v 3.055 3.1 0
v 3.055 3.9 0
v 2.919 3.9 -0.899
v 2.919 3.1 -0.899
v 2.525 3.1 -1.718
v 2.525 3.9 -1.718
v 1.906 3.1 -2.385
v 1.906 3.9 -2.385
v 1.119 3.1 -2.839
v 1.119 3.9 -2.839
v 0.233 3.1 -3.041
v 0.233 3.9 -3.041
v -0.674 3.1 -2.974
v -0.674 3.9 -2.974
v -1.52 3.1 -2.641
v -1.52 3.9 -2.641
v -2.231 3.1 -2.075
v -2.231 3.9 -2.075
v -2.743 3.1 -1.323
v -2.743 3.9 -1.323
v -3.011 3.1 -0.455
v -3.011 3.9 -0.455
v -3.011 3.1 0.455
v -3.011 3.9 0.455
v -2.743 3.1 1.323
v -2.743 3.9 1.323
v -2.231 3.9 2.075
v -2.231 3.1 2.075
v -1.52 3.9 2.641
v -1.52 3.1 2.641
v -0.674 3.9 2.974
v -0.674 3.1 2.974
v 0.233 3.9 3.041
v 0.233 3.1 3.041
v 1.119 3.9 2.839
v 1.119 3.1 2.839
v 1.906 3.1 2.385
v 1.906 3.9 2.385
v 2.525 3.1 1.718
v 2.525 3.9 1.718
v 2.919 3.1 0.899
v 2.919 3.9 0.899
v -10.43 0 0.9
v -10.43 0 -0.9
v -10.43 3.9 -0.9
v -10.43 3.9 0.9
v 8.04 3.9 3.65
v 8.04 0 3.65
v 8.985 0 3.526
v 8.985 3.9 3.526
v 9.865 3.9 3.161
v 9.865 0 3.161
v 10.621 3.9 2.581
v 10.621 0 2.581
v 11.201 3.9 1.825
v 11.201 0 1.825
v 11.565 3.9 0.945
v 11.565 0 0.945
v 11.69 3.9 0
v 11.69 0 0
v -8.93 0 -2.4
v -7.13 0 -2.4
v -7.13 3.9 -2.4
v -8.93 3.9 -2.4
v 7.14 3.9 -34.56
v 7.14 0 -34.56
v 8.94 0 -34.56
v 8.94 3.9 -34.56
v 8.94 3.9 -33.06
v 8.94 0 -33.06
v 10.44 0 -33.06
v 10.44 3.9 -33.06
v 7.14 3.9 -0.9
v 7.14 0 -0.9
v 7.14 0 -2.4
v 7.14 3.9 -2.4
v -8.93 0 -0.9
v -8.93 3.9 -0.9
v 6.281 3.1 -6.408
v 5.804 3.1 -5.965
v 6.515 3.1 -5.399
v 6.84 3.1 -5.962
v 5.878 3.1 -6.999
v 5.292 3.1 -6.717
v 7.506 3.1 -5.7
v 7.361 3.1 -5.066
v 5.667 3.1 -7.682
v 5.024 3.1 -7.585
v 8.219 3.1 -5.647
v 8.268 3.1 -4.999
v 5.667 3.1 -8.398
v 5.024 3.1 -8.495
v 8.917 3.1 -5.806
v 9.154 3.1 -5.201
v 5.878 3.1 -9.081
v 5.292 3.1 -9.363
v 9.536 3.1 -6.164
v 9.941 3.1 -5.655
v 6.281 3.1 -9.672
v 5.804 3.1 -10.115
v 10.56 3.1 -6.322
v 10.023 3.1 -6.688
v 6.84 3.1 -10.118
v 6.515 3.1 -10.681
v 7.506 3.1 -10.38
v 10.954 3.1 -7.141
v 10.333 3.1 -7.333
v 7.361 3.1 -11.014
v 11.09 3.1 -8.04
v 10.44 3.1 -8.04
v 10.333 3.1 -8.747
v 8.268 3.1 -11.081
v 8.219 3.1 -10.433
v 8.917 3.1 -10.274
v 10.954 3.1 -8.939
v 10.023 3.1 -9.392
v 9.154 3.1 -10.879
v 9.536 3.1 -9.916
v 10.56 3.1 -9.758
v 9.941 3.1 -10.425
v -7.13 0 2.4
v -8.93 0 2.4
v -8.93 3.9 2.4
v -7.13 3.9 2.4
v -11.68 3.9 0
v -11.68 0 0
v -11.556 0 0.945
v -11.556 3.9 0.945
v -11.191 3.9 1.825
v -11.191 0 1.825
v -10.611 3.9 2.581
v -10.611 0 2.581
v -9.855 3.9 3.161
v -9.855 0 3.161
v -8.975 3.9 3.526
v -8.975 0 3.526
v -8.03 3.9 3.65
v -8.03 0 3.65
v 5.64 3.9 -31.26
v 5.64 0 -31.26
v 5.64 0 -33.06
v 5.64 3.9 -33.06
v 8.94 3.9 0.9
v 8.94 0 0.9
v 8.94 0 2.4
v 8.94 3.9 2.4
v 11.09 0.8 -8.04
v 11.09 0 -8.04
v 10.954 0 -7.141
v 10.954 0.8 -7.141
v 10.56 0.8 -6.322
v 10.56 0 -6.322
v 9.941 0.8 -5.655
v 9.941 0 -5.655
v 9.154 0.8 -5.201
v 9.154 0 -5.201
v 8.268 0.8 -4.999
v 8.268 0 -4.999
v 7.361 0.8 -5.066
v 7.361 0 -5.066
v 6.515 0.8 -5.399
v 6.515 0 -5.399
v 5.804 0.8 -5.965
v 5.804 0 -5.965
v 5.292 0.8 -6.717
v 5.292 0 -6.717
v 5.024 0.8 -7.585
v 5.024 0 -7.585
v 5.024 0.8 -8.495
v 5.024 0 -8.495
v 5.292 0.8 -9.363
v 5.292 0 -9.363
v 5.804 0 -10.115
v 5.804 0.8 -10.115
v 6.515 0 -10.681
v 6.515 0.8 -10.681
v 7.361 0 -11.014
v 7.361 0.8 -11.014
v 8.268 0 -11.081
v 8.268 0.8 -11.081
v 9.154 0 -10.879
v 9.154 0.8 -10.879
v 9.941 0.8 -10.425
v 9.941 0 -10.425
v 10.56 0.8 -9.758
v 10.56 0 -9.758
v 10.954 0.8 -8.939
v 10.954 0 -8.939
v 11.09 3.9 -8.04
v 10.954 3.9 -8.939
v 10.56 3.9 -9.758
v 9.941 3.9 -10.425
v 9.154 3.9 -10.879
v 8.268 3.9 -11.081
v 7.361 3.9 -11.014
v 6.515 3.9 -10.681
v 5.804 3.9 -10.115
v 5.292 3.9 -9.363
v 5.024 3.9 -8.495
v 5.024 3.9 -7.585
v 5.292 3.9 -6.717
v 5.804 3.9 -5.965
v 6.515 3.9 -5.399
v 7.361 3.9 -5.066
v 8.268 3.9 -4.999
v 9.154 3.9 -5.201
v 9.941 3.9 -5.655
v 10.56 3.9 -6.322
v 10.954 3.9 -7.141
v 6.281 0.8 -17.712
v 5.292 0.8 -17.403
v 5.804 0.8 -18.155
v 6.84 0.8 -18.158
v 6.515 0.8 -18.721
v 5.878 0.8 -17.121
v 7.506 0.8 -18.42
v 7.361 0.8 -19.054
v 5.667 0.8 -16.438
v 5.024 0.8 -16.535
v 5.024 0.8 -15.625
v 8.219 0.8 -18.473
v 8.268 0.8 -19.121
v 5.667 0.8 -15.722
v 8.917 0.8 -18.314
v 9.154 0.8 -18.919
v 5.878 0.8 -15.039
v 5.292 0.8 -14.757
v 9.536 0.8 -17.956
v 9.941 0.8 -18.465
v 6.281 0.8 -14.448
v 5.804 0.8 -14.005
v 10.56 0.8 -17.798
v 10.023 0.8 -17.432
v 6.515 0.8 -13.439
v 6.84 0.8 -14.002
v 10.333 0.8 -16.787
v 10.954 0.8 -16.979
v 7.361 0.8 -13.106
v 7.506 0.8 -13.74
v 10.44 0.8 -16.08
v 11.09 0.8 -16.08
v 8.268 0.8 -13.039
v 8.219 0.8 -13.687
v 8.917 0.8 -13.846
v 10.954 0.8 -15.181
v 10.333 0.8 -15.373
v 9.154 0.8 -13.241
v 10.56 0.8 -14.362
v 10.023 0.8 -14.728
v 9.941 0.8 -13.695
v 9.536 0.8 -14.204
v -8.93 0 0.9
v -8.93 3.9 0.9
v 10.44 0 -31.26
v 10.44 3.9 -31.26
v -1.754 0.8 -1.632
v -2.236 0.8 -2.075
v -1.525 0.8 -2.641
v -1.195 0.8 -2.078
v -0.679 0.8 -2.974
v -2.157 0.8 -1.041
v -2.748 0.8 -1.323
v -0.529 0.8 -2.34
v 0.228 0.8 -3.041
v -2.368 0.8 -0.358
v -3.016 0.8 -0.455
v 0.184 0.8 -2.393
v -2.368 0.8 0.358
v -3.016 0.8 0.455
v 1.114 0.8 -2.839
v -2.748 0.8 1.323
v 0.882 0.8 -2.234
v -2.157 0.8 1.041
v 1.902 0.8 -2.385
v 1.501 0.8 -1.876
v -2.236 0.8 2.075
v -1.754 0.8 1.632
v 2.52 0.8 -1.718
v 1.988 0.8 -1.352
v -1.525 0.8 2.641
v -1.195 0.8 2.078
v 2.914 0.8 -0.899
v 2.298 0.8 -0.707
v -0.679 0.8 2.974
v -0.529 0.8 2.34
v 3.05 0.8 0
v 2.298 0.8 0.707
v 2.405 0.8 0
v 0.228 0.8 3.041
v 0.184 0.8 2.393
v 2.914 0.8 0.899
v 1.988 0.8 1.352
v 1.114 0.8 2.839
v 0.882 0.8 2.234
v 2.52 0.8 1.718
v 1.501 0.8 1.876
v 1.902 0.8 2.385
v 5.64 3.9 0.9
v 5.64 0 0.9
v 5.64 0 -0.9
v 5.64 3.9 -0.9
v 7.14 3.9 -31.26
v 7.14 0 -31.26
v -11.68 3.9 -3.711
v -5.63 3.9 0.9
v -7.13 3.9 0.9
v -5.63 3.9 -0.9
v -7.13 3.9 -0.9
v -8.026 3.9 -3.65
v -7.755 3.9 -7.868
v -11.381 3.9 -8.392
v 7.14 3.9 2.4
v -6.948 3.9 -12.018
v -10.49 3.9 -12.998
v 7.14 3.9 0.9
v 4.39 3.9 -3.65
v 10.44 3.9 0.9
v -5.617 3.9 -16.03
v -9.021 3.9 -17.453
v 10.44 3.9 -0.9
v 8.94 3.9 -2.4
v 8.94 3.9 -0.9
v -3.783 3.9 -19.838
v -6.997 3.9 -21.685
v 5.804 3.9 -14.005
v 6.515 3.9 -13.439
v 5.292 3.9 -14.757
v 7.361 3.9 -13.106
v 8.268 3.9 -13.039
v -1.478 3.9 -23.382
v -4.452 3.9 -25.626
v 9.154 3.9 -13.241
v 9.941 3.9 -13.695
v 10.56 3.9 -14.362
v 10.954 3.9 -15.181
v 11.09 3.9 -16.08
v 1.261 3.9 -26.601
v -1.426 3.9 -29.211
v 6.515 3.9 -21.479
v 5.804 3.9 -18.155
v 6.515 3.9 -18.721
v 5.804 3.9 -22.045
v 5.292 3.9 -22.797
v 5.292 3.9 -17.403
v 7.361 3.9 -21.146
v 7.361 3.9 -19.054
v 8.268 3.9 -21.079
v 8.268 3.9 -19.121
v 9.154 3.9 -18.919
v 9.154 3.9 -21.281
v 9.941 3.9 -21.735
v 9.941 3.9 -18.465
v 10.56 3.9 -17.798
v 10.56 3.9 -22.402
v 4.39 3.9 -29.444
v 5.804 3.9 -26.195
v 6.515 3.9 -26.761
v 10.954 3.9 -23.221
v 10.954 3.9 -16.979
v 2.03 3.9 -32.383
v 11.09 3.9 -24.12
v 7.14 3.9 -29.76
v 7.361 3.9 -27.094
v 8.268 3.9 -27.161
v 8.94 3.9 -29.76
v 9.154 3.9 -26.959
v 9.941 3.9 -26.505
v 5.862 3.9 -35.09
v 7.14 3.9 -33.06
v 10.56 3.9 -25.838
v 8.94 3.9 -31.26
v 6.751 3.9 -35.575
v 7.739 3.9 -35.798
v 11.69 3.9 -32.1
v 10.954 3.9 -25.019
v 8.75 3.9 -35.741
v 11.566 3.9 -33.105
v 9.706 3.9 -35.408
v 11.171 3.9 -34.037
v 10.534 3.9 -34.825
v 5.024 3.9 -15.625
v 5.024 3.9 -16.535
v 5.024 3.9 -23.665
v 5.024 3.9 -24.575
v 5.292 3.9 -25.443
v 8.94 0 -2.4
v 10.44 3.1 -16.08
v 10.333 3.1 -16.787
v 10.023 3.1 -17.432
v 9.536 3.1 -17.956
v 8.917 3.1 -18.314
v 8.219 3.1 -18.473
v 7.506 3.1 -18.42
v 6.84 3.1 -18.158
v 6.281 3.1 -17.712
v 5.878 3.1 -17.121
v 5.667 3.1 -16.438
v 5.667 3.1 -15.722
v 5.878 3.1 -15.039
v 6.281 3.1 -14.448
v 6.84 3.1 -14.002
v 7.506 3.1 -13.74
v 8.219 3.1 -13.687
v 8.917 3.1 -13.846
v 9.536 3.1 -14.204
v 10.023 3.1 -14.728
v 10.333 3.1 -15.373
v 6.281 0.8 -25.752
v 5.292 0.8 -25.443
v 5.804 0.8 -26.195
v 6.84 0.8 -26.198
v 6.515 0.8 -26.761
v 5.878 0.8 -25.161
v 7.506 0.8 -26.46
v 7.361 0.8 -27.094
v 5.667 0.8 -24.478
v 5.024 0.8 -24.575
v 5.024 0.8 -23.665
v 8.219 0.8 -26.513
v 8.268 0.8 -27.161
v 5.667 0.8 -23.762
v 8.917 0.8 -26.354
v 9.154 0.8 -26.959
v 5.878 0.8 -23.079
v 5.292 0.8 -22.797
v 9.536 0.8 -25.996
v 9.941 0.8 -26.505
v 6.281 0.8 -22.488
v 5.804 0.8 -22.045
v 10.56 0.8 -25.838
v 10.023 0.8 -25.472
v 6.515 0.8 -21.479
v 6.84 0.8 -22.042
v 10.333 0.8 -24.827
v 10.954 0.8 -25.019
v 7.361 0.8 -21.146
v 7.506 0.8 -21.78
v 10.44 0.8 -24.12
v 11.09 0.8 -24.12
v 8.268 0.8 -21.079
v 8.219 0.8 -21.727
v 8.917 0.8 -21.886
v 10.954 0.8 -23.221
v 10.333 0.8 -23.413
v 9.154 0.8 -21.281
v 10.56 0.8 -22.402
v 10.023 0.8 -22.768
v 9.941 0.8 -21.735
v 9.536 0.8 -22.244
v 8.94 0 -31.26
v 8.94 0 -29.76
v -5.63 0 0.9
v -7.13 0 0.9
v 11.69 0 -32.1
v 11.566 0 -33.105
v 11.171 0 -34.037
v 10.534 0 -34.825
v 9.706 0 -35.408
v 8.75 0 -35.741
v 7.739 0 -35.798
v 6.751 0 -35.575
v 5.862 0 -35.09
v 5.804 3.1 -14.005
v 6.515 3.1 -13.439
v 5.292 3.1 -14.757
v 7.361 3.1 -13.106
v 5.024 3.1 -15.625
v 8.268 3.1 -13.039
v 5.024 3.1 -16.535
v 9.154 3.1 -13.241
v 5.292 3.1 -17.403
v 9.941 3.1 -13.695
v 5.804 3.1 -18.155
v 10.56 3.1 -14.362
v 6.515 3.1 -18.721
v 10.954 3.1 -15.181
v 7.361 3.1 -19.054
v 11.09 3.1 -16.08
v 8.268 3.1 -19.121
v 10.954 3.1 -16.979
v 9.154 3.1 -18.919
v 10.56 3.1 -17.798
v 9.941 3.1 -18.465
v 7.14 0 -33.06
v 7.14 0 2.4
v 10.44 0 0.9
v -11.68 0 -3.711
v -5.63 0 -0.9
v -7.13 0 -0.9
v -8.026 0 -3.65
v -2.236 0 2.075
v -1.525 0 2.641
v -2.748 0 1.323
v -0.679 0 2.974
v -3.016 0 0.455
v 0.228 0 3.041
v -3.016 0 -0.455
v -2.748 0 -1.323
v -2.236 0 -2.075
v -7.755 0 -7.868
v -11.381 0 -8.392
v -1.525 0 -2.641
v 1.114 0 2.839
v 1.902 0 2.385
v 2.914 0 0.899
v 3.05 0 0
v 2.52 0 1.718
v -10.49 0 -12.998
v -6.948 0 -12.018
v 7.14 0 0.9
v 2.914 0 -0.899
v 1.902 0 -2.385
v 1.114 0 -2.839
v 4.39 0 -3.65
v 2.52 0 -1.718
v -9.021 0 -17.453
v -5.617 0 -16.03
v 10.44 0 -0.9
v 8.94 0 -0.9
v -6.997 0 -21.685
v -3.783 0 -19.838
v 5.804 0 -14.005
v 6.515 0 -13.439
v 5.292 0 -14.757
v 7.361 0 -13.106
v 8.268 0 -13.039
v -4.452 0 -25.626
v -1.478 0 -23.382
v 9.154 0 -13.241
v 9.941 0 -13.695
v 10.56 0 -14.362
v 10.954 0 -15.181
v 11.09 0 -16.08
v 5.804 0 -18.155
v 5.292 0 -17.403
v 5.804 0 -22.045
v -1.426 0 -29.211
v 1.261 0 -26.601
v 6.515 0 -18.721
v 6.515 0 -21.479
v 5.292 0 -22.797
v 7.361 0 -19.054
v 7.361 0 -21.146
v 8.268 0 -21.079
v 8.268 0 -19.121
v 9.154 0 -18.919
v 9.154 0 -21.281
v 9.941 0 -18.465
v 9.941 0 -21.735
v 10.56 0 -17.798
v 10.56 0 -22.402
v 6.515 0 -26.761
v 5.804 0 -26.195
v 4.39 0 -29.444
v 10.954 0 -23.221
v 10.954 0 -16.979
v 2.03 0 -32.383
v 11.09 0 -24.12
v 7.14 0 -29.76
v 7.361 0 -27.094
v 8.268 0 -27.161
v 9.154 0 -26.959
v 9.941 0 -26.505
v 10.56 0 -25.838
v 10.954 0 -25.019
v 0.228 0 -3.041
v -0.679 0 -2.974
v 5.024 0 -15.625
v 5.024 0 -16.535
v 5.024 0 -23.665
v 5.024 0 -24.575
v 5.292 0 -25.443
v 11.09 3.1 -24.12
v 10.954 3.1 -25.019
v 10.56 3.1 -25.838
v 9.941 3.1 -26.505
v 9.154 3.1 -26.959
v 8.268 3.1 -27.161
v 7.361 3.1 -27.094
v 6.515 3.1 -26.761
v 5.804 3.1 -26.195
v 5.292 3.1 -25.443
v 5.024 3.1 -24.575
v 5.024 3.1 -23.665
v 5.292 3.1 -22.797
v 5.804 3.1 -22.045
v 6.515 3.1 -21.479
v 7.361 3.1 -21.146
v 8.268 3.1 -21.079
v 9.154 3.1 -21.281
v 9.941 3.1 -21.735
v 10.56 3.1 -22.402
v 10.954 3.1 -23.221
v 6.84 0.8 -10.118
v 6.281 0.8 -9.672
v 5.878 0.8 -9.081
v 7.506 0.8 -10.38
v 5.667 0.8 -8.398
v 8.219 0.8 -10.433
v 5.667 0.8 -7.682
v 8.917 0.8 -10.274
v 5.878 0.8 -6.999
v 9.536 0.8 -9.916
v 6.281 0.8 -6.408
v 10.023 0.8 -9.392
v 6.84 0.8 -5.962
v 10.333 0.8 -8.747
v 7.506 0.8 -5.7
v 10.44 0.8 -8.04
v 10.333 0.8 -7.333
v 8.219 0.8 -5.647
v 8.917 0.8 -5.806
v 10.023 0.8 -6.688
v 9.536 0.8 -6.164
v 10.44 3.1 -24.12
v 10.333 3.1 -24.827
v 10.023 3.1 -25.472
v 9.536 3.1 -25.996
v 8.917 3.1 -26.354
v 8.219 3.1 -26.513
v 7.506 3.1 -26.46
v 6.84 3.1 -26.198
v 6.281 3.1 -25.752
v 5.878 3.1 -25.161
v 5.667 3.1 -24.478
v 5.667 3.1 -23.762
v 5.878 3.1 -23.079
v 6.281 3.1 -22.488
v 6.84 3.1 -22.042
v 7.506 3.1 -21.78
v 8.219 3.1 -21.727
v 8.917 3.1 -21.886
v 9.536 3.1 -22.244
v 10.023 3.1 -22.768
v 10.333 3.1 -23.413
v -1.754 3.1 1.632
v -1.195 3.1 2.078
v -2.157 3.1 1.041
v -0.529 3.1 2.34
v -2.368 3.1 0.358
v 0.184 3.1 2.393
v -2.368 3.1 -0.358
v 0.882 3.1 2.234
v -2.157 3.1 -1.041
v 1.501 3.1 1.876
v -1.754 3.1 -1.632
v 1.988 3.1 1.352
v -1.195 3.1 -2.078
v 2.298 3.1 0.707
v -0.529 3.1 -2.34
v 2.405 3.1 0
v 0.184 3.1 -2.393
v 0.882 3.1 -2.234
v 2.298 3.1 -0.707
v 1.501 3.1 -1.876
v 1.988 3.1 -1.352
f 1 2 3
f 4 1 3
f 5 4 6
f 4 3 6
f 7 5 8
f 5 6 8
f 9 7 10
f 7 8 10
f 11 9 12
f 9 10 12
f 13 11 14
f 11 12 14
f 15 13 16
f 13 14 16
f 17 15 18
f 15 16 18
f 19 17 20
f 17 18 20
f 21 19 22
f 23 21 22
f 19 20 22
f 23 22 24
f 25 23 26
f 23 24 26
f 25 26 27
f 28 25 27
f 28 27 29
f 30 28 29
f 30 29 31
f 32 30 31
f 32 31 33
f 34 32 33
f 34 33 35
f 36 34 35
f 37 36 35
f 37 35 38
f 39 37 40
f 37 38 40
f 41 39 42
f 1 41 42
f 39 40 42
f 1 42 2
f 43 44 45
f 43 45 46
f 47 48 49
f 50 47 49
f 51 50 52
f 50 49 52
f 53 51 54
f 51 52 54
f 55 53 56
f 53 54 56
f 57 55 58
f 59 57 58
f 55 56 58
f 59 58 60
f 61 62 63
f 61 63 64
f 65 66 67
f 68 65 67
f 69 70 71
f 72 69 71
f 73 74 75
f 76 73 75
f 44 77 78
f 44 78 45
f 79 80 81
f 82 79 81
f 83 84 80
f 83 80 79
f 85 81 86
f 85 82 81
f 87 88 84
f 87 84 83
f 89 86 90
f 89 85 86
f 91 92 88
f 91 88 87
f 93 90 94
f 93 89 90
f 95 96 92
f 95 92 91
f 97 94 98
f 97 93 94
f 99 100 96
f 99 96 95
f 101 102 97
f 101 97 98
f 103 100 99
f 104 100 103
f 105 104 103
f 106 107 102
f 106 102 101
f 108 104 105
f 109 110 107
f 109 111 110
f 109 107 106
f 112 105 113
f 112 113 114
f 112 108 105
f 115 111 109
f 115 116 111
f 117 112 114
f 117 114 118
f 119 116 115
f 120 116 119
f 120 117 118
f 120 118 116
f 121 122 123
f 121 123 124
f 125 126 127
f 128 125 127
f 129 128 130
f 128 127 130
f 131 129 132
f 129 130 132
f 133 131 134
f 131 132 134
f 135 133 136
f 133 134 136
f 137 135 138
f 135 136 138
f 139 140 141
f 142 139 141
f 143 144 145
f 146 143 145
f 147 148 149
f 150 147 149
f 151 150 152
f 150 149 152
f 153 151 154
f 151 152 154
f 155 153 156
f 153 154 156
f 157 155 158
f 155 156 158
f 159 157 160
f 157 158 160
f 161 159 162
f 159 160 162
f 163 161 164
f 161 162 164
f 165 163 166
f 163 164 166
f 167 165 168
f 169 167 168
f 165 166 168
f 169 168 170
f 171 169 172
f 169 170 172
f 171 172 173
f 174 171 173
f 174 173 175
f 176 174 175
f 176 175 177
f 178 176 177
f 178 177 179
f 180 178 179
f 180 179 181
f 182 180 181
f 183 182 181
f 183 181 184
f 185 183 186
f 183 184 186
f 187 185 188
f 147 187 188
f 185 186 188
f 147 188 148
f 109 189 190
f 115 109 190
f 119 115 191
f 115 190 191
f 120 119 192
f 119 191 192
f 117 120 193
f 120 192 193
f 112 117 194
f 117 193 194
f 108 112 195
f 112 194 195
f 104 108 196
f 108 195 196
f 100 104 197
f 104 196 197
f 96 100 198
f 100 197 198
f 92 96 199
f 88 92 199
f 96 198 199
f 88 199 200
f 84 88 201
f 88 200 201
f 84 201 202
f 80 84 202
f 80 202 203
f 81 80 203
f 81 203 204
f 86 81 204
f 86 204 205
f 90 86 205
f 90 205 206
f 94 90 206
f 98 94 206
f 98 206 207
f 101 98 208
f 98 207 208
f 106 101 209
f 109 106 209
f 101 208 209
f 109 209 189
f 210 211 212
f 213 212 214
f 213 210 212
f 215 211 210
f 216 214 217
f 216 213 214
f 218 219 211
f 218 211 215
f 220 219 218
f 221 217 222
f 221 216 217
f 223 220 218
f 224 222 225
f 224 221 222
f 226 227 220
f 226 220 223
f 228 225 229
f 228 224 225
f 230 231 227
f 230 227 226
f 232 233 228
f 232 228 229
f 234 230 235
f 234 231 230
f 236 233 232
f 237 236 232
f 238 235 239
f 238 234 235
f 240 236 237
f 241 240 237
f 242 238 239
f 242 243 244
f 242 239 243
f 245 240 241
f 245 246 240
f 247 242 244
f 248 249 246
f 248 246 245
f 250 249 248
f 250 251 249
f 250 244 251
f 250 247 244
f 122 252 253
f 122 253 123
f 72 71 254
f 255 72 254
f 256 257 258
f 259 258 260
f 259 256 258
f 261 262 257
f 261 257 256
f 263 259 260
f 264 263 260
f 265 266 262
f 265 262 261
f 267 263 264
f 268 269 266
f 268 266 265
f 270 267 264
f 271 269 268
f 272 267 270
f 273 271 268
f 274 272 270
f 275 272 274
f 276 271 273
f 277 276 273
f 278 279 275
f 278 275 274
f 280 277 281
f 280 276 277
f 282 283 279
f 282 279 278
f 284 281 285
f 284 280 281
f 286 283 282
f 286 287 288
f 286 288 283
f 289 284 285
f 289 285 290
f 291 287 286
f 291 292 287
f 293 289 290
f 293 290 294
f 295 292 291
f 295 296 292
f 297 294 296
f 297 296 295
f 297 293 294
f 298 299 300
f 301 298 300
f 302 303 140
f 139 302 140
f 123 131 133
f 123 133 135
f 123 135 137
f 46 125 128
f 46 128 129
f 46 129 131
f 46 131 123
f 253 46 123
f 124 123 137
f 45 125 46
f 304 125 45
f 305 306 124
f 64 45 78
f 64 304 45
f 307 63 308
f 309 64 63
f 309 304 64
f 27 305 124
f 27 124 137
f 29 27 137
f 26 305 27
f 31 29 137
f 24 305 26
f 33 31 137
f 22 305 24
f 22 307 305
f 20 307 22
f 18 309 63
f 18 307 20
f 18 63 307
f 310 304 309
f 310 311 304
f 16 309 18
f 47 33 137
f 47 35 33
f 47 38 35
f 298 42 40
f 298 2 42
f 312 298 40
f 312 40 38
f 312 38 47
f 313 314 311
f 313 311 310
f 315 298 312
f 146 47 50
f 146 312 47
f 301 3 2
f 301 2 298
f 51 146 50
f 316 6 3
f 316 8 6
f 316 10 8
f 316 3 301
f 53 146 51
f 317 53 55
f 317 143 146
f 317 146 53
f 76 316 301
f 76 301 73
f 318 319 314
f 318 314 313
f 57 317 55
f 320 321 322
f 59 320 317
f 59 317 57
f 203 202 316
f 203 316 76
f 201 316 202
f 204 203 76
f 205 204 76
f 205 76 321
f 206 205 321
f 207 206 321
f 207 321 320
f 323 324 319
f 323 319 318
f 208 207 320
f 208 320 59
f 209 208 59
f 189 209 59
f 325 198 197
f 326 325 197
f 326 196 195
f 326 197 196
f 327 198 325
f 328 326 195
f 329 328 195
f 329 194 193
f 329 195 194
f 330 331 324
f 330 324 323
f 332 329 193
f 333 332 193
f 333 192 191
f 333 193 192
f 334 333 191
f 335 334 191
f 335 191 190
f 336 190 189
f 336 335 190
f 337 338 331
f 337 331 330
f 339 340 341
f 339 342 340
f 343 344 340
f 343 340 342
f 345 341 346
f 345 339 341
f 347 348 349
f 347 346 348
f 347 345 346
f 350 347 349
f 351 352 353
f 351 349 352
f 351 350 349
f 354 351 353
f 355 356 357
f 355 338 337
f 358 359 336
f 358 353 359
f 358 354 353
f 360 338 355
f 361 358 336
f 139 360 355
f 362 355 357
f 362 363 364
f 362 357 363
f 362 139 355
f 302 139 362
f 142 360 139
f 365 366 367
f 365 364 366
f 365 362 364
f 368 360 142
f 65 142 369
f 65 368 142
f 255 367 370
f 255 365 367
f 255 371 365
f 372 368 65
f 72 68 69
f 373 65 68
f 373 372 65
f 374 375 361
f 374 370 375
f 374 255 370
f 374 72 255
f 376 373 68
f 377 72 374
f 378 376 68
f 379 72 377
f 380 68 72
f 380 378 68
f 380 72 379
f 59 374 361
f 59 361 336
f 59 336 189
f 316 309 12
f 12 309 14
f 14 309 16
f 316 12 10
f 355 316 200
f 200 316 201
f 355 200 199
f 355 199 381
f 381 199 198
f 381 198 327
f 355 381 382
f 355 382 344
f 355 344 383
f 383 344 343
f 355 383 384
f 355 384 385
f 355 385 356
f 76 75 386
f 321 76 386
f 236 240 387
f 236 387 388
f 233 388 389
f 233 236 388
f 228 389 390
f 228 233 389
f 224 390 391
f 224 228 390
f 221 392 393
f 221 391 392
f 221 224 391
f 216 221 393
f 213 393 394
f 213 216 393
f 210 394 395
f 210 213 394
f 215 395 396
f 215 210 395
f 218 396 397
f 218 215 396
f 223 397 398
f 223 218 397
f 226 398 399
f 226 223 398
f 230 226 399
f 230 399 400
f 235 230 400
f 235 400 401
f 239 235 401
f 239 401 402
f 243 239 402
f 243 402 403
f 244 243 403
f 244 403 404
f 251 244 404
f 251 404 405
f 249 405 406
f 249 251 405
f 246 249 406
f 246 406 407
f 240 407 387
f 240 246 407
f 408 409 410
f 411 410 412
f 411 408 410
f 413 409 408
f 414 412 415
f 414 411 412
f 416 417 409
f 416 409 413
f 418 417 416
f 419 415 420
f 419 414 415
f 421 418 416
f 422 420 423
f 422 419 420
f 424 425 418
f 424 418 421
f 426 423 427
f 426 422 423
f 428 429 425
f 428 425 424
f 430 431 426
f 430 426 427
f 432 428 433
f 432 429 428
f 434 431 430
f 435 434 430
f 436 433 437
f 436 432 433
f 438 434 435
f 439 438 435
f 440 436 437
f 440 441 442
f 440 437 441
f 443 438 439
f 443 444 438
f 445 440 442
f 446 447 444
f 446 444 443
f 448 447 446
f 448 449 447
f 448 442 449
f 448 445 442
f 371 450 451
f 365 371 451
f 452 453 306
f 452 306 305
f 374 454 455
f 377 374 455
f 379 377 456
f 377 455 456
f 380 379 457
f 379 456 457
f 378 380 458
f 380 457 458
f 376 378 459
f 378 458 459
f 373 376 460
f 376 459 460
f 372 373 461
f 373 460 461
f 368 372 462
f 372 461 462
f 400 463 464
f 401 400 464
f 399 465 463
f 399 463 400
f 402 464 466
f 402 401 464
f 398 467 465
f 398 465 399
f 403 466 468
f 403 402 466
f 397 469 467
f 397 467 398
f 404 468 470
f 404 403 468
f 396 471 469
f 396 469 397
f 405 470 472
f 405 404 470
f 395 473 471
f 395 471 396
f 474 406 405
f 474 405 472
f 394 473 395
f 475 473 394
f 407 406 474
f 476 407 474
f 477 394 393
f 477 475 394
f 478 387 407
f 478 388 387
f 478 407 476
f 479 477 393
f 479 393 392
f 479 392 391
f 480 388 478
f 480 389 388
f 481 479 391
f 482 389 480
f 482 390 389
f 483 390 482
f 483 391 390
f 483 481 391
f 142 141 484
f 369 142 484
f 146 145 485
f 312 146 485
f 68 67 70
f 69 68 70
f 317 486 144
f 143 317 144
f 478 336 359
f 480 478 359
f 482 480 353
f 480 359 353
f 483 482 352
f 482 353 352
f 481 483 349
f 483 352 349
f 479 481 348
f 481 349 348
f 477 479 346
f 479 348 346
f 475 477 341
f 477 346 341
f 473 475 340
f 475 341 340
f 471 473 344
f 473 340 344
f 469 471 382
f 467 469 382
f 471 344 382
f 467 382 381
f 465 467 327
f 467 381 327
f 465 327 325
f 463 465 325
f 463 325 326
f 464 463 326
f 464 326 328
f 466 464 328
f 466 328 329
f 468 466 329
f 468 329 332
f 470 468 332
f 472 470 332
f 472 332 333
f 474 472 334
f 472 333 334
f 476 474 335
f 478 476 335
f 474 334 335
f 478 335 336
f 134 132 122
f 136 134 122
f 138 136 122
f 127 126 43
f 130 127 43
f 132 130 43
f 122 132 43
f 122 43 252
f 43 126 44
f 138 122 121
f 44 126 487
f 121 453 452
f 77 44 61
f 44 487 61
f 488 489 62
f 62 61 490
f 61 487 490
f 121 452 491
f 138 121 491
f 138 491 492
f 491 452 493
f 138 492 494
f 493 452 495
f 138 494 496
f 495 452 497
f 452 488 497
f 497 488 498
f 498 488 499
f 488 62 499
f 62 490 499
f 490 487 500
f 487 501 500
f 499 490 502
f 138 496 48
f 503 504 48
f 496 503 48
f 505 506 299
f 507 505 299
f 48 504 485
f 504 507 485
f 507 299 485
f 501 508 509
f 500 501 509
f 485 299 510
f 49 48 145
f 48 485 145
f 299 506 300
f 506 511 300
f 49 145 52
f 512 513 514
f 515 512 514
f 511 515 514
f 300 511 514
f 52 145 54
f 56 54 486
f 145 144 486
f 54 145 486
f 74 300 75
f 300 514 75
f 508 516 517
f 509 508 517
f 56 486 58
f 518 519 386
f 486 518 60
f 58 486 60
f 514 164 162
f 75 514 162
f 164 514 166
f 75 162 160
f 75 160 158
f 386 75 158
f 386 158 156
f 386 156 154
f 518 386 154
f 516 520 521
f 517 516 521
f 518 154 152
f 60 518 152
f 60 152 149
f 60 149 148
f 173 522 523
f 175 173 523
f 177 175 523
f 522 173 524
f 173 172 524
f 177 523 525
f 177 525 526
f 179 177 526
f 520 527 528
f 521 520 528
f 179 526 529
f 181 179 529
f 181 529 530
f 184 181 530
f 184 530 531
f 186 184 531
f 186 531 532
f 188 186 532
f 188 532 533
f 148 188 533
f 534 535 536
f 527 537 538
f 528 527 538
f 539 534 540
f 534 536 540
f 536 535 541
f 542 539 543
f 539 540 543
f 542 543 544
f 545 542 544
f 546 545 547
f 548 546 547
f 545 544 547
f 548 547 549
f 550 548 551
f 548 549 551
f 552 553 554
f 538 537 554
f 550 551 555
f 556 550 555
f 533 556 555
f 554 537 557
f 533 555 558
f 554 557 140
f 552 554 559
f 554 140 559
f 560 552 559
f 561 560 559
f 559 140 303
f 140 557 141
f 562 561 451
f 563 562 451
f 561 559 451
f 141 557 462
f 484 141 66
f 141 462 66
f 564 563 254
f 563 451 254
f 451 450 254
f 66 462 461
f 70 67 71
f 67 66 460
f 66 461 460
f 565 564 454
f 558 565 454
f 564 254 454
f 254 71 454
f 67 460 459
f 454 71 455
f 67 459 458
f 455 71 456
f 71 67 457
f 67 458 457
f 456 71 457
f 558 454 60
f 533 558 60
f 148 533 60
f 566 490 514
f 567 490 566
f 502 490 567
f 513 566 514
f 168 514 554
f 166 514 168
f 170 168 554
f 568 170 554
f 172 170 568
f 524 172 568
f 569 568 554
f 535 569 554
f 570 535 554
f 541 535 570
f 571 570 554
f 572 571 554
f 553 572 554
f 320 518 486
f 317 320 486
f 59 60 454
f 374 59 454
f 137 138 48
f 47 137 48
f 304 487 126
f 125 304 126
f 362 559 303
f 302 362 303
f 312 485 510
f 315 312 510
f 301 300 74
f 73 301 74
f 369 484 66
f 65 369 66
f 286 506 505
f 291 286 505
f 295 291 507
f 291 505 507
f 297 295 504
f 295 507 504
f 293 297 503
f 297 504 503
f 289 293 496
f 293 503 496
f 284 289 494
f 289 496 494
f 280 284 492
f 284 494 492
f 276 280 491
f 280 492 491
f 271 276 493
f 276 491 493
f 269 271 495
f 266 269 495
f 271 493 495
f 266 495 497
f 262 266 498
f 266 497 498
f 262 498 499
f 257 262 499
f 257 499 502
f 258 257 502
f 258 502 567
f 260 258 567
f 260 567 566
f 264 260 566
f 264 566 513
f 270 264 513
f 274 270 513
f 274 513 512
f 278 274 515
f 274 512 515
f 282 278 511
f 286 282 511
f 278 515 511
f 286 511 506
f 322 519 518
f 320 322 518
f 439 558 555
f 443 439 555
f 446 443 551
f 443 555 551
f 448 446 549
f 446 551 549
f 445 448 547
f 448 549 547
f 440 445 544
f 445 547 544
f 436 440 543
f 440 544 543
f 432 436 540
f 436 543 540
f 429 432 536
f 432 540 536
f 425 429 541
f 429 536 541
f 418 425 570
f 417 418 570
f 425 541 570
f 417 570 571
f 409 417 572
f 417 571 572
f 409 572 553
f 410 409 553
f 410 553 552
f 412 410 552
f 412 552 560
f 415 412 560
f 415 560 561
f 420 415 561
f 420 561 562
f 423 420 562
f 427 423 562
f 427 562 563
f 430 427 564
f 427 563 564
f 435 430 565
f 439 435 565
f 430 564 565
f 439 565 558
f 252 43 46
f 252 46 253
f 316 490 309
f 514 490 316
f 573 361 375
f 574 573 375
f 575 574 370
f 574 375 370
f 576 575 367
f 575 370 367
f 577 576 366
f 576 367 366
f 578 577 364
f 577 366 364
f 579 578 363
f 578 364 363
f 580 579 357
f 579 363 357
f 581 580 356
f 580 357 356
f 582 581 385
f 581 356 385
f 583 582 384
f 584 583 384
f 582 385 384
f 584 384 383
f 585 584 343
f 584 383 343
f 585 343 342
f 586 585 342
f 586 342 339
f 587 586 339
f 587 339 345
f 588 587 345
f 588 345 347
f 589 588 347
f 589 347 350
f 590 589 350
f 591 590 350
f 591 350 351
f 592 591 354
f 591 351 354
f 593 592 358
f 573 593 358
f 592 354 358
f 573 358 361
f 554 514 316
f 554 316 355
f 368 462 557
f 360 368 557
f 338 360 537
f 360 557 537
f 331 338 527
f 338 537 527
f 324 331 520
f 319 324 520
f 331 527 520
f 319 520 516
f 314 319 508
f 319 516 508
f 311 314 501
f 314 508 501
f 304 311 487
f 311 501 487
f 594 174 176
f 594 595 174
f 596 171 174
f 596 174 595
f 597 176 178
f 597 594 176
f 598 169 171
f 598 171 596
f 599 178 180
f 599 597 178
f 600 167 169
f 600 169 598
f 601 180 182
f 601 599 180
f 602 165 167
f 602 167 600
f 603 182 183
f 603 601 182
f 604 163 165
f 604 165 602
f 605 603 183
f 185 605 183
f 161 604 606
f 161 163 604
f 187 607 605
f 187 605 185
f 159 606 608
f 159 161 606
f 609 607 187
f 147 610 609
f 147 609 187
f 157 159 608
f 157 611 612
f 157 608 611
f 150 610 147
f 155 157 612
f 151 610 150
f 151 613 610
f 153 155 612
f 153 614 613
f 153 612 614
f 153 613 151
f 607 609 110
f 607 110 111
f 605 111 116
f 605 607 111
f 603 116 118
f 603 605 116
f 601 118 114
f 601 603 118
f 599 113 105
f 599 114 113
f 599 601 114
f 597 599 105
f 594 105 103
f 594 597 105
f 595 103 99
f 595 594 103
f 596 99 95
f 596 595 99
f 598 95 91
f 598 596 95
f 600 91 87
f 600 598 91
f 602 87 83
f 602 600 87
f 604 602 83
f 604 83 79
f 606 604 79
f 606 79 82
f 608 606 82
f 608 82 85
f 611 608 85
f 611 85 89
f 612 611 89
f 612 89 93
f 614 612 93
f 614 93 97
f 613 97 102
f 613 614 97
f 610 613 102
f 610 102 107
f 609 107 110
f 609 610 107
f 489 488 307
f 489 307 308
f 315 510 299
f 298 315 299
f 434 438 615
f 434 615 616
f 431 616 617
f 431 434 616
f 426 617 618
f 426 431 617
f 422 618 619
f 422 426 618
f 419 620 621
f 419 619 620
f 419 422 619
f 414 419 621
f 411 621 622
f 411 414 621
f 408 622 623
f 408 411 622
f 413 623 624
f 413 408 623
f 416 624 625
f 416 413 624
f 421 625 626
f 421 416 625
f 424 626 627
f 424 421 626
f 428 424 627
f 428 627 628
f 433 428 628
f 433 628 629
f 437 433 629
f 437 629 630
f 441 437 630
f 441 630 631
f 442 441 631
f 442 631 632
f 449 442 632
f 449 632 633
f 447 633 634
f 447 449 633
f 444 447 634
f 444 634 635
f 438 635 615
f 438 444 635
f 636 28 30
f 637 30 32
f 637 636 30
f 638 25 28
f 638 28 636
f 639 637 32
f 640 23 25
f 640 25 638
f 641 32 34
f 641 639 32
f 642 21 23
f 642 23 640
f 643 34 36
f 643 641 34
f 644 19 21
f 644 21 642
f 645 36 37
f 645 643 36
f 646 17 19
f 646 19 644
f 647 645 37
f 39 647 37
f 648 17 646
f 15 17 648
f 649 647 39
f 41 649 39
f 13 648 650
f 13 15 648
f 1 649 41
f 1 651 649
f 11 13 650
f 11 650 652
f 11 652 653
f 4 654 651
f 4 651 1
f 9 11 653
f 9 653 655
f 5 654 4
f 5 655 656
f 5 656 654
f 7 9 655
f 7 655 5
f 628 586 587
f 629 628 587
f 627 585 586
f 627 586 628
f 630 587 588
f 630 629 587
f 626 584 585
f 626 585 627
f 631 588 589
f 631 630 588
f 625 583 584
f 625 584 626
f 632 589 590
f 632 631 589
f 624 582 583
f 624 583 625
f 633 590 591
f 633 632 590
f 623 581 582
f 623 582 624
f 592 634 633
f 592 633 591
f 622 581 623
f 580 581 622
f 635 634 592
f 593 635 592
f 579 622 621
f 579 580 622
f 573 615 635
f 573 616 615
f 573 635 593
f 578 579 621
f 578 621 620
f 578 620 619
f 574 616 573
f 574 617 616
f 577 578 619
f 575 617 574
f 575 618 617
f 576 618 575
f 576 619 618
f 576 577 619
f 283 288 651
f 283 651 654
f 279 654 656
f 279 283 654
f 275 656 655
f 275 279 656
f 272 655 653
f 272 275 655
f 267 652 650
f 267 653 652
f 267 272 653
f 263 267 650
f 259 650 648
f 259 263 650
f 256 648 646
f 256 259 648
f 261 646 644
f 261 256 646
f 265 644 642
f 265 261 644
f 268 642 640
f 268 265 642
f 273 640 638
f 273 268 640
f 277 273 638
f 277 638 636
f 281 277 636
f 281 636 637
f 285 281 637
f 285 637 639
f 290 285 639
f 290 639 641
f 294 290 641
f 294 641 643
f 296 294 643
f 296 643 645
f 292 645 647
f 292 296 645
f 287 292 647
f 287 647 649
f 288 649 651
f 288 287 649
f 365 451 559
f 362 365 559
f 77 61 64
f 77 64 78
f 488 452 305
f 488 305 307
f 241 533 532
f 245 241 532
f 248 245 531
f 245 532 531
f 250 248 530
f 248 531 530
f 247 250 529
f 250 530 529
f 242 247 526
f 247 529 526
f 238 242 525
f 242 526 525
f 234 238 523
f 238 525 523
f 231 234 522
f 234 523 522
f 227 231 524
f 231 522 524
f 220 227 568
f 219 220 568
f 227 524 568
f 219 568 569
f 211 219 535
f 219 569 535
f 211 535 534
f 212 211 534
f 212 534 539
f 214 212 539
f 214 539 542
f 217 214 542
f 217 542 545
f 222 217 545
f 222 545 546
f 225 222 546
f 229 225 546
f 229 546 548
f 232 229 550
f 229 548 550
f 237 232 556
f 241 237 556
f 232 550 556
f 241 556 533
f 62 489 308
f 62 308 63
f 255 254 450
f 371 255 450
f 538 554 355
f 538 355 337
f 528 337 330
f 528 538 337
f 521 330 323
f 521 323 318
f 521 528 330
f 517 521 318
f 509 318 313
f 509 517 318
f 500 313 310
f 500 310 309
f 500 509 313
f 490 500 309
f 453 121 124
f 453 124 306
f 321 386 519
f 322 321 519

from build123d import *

# Parameters (mm, degrees)
SKETCH1_R           = 2.4
BOSS_EXTRUDE3_DEPTH = 3.9
SKETCH3_R           = 3.05
CUT_EXTRUDE16_DEPTH = 0.8
SKETCH4_R           = 3.05
CUT_EXTRUDE17_DEPTH = 0.8


with BuildPart() as part:
    # Sketch1 → Boss-Extrude3 (new body)
    with BuildSketch(Plane(origin=(0, 0, 0), x_dir=(1, 0, 0), z_dir=(0, 1, 0))):
        with BuildLine():
            Line((-8.030145899, -3.65), (8.039854101, -3.65))
            ThreePointArc((8.039854101, -3.65), (10.620793852, -2.580939751), (11.689854101, 0))
            Line((11.689854101, 0), (11.689854101, 32.1))
            ThreePointArc((11.689854101, 32.1), (9.706187522, 35.407989059), (5.862167957, 35.08980939))
            ThreePointArc((5.862167957, 35.08980939), (-6.996855856, 21.685482921), (-11.680145899, 3.710576637))
            Line((-11.680145899, 3.710576637), (-11.680145899, 0))
            ThreePointArc((-11.680145899, 0), (-10.611085651, -2.580939751), (-8.030145899, -3.65))
        make_face()
        with Locations((0.004854101, 0)):
            Circle(SKETCH1_R, mode=Mode.SUBTRACT)
        with Locations((8.039854101, 24.12)):
            Circle(SKETCH1_R, mode=Mode.SUBTRACT)
        with Locations((8.039854101, 16.08)):
            Circle(SKETCH1_R, mode=Mode.SUBTRACT)
        with Locations((8.039854101, 8.04)):
            Circle(SKETCH1_R, mode=Mode.SUBTRACT)
        with BuildLine():
            Line((-8.025815842, 3.649998716), (4.389854101, 3.649998716))
            Line((4.389854101, 3.649998716), (4.389854101, 29.443552649))
            ThreePointArc((4.389854101, 29.443552649), (-4.761047259, 17.963414157), (-8.025815842, 3.649998716))
        make_face(mode=Mode.SUBTRACT)
        Polygon((-8.930145899, 0.9), (-10.430145899, 0.9), (-10.430145899, -0.9), (-8.930145899, -0.9), (-8.930145899, -2.4), (-7.130145899, -2.4), (-7.130145899, -0.9), (-5.630145899, -0.9), (-5.630145899, 0.9), (-7.130145899, 0.9), (-7.130145899, 2.4), (-8.930145899, 2.4), align=None, mode=Mode.SUBTRACT)
        Polygon((10.439854101, -0.9), (8.939854101, -0.9), (8.939854101, -2.4), (7.139854101, -2.4), (7.139854101, -0.9), (5.639854101, -0.9), (5.639854101, 0.9), (7.139854101, 0.9), (7.139854101, 2.4), (8.939854101, 2.4), (8.939854101, 0.9), (10.439854101, 0.9), align=None, mode=Mode.SUBTRACT)
        Polygon((5.639854101, 33.06), (7.139854101, 33.06), (7.139854101, 34.56), (8.939854101, 34.56), (8.939854101, 33.06), (10.439854101, 33.06), (10.439854101, 31.26), (8.939854101, 31.26), (8.939854101, 29.76), (7.139854101, 29.76), (7.139854101, 31.26), (5.639854101, 31.26), align=None, mode=Mode.SUBTRACT)
    extrude(amount=BOSS_EXTRUDE3_DEPTH)

    # Sketch3 → Cut-Extrude16 (cut)
    with BuildSketch(Plane(origin=(0, 3.9, 0), x_dir=(1, 0, 0), z_dir=(0, 1, 0))):
        with Locations((0.004854101, 0)):
            Circle(SKETCH3_R)
        with Locations((8.039854101, 8.04)):
            Circle(SKETCH3_R)
        with Locations((8.039854101, 16.08)):
            Circle(SKETCH3_R)
        with Locations((8.039854101, 24.12)):
            Circle(SKETCH3_R)
    extrude(amount=-CUT_EXTRUDE16_DEPTH, mode=Mode.SUBTRACT)

    # Sketch4 → Cut-Extrude17 (cut)
    with BuildSketch(Plane.XZ):
        Circle(SKETCH4_R)
        with Locations((8.039854101, -8.04)):
            Circle(SKETCH4_R)
        with Locations((8.039854101, -16.08)):
            Circle(SKETCH4_R)
        with Locations((8.039854101, -24.12)):
            Circle(SKETCH4_R)
    extrude(amount=-CUT_EXTRUDE17_DEPTH, mode=Mode.SUBTRACT)


solid = part.part
